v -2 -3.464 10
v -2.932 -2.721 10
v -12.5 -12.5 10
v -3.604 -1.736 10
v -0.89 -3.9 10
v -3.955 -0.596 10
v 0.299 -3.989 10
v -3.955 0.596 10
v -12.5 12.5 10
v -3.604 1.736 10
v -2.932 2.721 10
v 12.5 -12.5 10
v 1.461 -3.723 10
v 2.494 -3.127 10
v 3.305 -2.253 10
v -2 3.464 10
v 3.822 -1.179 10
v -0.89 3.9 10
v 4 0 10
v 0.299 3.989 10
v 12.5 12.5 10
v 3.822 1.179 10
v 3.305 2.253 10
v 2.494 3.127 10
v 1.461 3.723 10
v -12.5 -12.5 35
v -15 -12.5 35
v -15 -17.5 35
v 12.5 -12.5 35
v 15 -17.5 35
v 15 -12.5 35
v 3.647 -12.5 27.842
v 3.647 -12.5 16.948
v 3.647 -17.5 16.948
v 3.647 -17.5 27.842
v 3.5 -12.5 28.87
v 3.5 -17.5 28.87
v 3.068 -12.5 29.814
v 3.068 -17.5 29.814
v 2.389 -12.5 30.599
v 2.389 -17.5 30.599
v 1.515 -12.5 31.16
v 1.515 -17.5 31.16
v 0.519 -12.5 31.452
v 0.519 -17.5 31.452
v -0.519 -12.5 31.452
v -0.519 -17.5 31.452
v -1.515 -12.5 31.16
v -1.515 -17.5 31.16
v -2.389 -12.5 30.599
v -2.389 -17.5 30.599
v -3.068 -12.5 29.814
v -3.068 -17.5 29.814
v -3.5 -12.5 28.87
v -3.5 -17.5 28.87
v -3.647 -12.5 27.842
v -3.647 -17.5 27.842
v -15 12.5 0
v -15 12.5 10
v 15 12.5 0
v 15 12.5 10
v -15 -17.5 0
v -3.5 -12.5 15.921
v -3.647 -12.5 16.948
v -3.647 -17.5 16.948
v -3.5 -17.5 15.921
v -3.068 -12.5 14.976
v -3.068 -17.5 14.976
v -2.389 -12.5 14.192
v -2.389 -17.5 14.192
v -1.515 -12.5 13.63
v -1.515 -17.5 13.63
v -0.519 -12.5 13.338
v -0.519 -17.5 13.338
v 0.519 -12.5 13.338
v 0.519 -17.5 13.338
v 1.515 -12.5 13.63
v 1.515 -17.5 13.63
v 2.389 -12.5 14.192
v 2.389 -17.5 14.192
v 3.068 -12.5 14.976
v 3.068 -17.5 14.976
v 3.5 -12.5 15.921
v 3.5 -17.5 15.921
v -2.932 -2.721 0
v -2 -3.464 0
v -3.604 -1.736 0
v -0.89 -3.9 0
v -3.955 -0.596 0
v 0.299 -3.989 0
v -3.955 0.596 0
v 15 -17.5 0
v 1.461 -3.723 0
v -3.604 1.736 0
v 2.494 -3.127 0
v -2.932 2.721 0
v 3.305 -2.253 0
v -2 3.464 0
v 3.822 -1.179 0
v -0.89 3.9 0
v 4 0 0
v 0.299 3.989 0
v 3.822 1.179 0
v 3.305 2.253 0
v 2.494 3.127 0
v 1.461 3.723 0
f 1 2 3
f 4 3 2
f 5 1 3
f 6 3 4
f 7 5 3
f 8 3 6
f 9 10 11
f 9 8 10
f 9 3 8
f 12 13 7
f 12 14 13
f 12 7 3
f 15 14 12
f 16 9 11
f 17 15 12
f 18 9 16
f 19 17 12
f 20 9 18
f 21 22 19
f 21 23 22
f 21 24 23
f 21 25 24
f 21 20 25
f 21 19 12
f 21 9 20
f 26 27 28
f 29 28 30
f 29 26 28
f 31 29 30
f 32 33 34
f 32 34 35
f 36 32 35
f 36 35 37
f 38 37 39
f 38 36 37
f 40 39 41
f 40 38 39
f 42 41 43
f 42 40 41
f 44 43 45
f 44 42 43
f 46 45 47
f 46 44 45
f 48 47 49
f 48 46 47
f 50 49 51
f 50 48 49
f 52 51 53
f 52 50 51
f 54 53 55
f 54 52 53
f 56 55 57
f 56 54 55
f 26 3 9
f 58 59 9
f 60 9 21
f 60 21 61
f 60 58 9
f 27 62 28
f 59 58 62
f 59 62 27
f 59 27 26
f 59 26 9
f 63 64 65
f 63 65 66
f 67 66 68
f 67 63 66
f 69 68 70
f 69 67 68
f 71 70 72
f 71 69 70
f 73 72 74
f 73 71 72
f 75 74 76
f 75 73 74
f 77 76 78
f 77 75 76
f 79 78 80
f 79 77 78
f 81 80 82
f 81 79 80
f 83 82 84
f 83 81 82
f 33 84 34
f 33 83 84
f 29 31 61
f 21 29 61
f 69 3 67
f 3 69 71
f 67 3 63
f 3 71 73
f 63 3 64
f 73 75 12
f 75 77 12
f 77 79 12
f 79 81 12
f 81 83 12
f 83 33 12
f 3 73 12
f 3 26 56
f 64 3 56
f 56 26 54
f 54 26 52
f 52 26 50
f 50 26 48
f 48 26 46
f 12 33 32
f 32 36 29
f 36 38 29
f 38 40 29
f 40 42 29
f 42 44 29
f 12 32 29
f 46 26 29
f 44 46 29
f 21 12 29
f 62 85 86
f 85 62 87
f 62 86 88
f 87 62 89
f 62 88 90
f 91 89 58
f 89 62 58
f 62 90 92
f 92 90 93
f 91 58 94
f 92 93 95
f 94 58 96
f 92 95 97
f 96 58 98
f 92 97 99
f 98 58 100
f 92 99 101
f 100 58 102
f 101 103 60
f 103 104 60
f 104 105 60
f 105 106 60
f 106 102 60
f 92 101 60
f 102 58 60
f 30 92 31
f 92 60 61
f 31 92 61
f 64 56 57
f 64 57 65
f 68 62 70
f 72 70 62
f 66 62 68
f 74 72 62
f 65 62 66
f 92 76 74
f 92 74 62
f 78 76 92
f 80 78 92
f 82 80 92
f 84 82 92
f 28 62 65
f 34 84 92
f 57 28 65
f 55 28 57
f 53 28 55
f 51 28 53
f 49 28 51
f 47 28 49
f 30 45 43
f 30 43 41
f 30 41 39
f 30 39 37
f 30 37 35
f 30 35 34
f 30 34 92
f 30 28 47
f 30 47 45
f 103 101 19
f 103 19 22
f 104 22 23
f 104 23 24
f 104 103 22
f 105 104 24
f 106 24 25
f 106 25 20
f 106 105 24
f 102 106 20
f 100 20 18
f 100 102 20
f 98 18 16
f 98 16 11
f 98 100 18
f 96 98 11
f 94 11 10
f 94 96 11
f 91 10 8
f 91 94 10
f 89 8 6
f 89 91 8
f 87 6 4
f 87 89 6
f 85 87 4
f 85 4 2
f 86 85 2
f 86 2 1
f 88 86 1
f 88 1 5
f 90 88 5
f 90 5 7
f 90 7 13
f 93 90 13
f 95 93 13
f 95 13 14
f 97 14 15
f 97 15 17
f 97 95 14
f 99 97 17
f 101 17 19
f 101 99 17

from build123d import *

# Parameters (mm, degrees)
SKETCH1_W               = 30
SKETCH1_H               = 25
SKETCH1_R               = 4
BOSS_EXTRUDE1_DEPTH     = 10
SKETCH2_W               = 30
SKETCH2_H               = 35
BOSS_EXTRUDE3_DEPTH     = 5
BOSS_EXTRUDE4_DEPTH     = 2.5
CUT_EXTRUDE1_DEPTH      = 26
CUT_EXTRUDE1_DEPTH_BACK = 6


with BuildPart() as part:
    # Sketch1 → Boss-Extrude1 (new body)
    with BuildSketch(Plane.XY):
        Rectangle(SKETCH1_W, SKETCH1_H)
        Circle(SKETCH1_R, mode=Mode.SUBTRACT)
    extrude(amount=BOSS_EXTRUDE1_DEPTH)

    # Sketch2 → Boss-Extrude3 (add)
    with BuildSketch(Plane.XZ.offset(12.5)):
        with Locations((0, 17.5)):
            Rectangle(SKETCH2_W, SKETCH2_H)
    extrude(amount=BOSS_EXTRUDE3_DEPTH)

    # Sketch7 → Boss-Extrude4 (add)
    with BuildSketch(Plane(origin=(15, 0, 0), x_dir=(0, 0, -1), z_dir=(1, 0, 0))):
        Polygon((-35, -12.5), (-10, 12.5), (-10, -12.5), align=None)
    boss_extrude4 = extrude(amount=-BOSS_EXTRUDE4_DEPTH)

    # Mirror1: Boss-Extrude4 across plane
    add(boss_extrude4.mirror(Plane(origin=(0, 0, 0), x_dir=(0, 0, 1), z_dir=(1, 0, 0))))

    # Sketch8 → Cut-Extrude1 (cut, two sides)
    with BuildSketch(Plane(origin=(0, -12.5, 0), x_dir=(1, 0, 0), z_dir=(0, 1, 0))) as cut_extrude1_sk:
        with BuildLine():
            Line((3.647363535, -16.948096307), (3.647363535, -27.842195287))
            ThreePointArc((3.647363535, -27.842195287), (0, -31.489558822), (-3.647363535, -27.842195287))
            Line((-3.647363535, -27.842195287), (-3.647363535, -16.948096307))
            ThreePointArc((-3.647363535, -16.948096307), (0, -13.300732772), (3.647363535, -16.948096307))
        make_face()
    extrude(amount=CUT_EXTRUDE1_DEPTH, mode=Mode.SUBTRACT)
    extrude(cut_extrude1_sk.sketch, amount=-CUT_EXTRUDE1_DEPTH_BACK, mode=Mode.SUBTRACT)


solid = part.part
